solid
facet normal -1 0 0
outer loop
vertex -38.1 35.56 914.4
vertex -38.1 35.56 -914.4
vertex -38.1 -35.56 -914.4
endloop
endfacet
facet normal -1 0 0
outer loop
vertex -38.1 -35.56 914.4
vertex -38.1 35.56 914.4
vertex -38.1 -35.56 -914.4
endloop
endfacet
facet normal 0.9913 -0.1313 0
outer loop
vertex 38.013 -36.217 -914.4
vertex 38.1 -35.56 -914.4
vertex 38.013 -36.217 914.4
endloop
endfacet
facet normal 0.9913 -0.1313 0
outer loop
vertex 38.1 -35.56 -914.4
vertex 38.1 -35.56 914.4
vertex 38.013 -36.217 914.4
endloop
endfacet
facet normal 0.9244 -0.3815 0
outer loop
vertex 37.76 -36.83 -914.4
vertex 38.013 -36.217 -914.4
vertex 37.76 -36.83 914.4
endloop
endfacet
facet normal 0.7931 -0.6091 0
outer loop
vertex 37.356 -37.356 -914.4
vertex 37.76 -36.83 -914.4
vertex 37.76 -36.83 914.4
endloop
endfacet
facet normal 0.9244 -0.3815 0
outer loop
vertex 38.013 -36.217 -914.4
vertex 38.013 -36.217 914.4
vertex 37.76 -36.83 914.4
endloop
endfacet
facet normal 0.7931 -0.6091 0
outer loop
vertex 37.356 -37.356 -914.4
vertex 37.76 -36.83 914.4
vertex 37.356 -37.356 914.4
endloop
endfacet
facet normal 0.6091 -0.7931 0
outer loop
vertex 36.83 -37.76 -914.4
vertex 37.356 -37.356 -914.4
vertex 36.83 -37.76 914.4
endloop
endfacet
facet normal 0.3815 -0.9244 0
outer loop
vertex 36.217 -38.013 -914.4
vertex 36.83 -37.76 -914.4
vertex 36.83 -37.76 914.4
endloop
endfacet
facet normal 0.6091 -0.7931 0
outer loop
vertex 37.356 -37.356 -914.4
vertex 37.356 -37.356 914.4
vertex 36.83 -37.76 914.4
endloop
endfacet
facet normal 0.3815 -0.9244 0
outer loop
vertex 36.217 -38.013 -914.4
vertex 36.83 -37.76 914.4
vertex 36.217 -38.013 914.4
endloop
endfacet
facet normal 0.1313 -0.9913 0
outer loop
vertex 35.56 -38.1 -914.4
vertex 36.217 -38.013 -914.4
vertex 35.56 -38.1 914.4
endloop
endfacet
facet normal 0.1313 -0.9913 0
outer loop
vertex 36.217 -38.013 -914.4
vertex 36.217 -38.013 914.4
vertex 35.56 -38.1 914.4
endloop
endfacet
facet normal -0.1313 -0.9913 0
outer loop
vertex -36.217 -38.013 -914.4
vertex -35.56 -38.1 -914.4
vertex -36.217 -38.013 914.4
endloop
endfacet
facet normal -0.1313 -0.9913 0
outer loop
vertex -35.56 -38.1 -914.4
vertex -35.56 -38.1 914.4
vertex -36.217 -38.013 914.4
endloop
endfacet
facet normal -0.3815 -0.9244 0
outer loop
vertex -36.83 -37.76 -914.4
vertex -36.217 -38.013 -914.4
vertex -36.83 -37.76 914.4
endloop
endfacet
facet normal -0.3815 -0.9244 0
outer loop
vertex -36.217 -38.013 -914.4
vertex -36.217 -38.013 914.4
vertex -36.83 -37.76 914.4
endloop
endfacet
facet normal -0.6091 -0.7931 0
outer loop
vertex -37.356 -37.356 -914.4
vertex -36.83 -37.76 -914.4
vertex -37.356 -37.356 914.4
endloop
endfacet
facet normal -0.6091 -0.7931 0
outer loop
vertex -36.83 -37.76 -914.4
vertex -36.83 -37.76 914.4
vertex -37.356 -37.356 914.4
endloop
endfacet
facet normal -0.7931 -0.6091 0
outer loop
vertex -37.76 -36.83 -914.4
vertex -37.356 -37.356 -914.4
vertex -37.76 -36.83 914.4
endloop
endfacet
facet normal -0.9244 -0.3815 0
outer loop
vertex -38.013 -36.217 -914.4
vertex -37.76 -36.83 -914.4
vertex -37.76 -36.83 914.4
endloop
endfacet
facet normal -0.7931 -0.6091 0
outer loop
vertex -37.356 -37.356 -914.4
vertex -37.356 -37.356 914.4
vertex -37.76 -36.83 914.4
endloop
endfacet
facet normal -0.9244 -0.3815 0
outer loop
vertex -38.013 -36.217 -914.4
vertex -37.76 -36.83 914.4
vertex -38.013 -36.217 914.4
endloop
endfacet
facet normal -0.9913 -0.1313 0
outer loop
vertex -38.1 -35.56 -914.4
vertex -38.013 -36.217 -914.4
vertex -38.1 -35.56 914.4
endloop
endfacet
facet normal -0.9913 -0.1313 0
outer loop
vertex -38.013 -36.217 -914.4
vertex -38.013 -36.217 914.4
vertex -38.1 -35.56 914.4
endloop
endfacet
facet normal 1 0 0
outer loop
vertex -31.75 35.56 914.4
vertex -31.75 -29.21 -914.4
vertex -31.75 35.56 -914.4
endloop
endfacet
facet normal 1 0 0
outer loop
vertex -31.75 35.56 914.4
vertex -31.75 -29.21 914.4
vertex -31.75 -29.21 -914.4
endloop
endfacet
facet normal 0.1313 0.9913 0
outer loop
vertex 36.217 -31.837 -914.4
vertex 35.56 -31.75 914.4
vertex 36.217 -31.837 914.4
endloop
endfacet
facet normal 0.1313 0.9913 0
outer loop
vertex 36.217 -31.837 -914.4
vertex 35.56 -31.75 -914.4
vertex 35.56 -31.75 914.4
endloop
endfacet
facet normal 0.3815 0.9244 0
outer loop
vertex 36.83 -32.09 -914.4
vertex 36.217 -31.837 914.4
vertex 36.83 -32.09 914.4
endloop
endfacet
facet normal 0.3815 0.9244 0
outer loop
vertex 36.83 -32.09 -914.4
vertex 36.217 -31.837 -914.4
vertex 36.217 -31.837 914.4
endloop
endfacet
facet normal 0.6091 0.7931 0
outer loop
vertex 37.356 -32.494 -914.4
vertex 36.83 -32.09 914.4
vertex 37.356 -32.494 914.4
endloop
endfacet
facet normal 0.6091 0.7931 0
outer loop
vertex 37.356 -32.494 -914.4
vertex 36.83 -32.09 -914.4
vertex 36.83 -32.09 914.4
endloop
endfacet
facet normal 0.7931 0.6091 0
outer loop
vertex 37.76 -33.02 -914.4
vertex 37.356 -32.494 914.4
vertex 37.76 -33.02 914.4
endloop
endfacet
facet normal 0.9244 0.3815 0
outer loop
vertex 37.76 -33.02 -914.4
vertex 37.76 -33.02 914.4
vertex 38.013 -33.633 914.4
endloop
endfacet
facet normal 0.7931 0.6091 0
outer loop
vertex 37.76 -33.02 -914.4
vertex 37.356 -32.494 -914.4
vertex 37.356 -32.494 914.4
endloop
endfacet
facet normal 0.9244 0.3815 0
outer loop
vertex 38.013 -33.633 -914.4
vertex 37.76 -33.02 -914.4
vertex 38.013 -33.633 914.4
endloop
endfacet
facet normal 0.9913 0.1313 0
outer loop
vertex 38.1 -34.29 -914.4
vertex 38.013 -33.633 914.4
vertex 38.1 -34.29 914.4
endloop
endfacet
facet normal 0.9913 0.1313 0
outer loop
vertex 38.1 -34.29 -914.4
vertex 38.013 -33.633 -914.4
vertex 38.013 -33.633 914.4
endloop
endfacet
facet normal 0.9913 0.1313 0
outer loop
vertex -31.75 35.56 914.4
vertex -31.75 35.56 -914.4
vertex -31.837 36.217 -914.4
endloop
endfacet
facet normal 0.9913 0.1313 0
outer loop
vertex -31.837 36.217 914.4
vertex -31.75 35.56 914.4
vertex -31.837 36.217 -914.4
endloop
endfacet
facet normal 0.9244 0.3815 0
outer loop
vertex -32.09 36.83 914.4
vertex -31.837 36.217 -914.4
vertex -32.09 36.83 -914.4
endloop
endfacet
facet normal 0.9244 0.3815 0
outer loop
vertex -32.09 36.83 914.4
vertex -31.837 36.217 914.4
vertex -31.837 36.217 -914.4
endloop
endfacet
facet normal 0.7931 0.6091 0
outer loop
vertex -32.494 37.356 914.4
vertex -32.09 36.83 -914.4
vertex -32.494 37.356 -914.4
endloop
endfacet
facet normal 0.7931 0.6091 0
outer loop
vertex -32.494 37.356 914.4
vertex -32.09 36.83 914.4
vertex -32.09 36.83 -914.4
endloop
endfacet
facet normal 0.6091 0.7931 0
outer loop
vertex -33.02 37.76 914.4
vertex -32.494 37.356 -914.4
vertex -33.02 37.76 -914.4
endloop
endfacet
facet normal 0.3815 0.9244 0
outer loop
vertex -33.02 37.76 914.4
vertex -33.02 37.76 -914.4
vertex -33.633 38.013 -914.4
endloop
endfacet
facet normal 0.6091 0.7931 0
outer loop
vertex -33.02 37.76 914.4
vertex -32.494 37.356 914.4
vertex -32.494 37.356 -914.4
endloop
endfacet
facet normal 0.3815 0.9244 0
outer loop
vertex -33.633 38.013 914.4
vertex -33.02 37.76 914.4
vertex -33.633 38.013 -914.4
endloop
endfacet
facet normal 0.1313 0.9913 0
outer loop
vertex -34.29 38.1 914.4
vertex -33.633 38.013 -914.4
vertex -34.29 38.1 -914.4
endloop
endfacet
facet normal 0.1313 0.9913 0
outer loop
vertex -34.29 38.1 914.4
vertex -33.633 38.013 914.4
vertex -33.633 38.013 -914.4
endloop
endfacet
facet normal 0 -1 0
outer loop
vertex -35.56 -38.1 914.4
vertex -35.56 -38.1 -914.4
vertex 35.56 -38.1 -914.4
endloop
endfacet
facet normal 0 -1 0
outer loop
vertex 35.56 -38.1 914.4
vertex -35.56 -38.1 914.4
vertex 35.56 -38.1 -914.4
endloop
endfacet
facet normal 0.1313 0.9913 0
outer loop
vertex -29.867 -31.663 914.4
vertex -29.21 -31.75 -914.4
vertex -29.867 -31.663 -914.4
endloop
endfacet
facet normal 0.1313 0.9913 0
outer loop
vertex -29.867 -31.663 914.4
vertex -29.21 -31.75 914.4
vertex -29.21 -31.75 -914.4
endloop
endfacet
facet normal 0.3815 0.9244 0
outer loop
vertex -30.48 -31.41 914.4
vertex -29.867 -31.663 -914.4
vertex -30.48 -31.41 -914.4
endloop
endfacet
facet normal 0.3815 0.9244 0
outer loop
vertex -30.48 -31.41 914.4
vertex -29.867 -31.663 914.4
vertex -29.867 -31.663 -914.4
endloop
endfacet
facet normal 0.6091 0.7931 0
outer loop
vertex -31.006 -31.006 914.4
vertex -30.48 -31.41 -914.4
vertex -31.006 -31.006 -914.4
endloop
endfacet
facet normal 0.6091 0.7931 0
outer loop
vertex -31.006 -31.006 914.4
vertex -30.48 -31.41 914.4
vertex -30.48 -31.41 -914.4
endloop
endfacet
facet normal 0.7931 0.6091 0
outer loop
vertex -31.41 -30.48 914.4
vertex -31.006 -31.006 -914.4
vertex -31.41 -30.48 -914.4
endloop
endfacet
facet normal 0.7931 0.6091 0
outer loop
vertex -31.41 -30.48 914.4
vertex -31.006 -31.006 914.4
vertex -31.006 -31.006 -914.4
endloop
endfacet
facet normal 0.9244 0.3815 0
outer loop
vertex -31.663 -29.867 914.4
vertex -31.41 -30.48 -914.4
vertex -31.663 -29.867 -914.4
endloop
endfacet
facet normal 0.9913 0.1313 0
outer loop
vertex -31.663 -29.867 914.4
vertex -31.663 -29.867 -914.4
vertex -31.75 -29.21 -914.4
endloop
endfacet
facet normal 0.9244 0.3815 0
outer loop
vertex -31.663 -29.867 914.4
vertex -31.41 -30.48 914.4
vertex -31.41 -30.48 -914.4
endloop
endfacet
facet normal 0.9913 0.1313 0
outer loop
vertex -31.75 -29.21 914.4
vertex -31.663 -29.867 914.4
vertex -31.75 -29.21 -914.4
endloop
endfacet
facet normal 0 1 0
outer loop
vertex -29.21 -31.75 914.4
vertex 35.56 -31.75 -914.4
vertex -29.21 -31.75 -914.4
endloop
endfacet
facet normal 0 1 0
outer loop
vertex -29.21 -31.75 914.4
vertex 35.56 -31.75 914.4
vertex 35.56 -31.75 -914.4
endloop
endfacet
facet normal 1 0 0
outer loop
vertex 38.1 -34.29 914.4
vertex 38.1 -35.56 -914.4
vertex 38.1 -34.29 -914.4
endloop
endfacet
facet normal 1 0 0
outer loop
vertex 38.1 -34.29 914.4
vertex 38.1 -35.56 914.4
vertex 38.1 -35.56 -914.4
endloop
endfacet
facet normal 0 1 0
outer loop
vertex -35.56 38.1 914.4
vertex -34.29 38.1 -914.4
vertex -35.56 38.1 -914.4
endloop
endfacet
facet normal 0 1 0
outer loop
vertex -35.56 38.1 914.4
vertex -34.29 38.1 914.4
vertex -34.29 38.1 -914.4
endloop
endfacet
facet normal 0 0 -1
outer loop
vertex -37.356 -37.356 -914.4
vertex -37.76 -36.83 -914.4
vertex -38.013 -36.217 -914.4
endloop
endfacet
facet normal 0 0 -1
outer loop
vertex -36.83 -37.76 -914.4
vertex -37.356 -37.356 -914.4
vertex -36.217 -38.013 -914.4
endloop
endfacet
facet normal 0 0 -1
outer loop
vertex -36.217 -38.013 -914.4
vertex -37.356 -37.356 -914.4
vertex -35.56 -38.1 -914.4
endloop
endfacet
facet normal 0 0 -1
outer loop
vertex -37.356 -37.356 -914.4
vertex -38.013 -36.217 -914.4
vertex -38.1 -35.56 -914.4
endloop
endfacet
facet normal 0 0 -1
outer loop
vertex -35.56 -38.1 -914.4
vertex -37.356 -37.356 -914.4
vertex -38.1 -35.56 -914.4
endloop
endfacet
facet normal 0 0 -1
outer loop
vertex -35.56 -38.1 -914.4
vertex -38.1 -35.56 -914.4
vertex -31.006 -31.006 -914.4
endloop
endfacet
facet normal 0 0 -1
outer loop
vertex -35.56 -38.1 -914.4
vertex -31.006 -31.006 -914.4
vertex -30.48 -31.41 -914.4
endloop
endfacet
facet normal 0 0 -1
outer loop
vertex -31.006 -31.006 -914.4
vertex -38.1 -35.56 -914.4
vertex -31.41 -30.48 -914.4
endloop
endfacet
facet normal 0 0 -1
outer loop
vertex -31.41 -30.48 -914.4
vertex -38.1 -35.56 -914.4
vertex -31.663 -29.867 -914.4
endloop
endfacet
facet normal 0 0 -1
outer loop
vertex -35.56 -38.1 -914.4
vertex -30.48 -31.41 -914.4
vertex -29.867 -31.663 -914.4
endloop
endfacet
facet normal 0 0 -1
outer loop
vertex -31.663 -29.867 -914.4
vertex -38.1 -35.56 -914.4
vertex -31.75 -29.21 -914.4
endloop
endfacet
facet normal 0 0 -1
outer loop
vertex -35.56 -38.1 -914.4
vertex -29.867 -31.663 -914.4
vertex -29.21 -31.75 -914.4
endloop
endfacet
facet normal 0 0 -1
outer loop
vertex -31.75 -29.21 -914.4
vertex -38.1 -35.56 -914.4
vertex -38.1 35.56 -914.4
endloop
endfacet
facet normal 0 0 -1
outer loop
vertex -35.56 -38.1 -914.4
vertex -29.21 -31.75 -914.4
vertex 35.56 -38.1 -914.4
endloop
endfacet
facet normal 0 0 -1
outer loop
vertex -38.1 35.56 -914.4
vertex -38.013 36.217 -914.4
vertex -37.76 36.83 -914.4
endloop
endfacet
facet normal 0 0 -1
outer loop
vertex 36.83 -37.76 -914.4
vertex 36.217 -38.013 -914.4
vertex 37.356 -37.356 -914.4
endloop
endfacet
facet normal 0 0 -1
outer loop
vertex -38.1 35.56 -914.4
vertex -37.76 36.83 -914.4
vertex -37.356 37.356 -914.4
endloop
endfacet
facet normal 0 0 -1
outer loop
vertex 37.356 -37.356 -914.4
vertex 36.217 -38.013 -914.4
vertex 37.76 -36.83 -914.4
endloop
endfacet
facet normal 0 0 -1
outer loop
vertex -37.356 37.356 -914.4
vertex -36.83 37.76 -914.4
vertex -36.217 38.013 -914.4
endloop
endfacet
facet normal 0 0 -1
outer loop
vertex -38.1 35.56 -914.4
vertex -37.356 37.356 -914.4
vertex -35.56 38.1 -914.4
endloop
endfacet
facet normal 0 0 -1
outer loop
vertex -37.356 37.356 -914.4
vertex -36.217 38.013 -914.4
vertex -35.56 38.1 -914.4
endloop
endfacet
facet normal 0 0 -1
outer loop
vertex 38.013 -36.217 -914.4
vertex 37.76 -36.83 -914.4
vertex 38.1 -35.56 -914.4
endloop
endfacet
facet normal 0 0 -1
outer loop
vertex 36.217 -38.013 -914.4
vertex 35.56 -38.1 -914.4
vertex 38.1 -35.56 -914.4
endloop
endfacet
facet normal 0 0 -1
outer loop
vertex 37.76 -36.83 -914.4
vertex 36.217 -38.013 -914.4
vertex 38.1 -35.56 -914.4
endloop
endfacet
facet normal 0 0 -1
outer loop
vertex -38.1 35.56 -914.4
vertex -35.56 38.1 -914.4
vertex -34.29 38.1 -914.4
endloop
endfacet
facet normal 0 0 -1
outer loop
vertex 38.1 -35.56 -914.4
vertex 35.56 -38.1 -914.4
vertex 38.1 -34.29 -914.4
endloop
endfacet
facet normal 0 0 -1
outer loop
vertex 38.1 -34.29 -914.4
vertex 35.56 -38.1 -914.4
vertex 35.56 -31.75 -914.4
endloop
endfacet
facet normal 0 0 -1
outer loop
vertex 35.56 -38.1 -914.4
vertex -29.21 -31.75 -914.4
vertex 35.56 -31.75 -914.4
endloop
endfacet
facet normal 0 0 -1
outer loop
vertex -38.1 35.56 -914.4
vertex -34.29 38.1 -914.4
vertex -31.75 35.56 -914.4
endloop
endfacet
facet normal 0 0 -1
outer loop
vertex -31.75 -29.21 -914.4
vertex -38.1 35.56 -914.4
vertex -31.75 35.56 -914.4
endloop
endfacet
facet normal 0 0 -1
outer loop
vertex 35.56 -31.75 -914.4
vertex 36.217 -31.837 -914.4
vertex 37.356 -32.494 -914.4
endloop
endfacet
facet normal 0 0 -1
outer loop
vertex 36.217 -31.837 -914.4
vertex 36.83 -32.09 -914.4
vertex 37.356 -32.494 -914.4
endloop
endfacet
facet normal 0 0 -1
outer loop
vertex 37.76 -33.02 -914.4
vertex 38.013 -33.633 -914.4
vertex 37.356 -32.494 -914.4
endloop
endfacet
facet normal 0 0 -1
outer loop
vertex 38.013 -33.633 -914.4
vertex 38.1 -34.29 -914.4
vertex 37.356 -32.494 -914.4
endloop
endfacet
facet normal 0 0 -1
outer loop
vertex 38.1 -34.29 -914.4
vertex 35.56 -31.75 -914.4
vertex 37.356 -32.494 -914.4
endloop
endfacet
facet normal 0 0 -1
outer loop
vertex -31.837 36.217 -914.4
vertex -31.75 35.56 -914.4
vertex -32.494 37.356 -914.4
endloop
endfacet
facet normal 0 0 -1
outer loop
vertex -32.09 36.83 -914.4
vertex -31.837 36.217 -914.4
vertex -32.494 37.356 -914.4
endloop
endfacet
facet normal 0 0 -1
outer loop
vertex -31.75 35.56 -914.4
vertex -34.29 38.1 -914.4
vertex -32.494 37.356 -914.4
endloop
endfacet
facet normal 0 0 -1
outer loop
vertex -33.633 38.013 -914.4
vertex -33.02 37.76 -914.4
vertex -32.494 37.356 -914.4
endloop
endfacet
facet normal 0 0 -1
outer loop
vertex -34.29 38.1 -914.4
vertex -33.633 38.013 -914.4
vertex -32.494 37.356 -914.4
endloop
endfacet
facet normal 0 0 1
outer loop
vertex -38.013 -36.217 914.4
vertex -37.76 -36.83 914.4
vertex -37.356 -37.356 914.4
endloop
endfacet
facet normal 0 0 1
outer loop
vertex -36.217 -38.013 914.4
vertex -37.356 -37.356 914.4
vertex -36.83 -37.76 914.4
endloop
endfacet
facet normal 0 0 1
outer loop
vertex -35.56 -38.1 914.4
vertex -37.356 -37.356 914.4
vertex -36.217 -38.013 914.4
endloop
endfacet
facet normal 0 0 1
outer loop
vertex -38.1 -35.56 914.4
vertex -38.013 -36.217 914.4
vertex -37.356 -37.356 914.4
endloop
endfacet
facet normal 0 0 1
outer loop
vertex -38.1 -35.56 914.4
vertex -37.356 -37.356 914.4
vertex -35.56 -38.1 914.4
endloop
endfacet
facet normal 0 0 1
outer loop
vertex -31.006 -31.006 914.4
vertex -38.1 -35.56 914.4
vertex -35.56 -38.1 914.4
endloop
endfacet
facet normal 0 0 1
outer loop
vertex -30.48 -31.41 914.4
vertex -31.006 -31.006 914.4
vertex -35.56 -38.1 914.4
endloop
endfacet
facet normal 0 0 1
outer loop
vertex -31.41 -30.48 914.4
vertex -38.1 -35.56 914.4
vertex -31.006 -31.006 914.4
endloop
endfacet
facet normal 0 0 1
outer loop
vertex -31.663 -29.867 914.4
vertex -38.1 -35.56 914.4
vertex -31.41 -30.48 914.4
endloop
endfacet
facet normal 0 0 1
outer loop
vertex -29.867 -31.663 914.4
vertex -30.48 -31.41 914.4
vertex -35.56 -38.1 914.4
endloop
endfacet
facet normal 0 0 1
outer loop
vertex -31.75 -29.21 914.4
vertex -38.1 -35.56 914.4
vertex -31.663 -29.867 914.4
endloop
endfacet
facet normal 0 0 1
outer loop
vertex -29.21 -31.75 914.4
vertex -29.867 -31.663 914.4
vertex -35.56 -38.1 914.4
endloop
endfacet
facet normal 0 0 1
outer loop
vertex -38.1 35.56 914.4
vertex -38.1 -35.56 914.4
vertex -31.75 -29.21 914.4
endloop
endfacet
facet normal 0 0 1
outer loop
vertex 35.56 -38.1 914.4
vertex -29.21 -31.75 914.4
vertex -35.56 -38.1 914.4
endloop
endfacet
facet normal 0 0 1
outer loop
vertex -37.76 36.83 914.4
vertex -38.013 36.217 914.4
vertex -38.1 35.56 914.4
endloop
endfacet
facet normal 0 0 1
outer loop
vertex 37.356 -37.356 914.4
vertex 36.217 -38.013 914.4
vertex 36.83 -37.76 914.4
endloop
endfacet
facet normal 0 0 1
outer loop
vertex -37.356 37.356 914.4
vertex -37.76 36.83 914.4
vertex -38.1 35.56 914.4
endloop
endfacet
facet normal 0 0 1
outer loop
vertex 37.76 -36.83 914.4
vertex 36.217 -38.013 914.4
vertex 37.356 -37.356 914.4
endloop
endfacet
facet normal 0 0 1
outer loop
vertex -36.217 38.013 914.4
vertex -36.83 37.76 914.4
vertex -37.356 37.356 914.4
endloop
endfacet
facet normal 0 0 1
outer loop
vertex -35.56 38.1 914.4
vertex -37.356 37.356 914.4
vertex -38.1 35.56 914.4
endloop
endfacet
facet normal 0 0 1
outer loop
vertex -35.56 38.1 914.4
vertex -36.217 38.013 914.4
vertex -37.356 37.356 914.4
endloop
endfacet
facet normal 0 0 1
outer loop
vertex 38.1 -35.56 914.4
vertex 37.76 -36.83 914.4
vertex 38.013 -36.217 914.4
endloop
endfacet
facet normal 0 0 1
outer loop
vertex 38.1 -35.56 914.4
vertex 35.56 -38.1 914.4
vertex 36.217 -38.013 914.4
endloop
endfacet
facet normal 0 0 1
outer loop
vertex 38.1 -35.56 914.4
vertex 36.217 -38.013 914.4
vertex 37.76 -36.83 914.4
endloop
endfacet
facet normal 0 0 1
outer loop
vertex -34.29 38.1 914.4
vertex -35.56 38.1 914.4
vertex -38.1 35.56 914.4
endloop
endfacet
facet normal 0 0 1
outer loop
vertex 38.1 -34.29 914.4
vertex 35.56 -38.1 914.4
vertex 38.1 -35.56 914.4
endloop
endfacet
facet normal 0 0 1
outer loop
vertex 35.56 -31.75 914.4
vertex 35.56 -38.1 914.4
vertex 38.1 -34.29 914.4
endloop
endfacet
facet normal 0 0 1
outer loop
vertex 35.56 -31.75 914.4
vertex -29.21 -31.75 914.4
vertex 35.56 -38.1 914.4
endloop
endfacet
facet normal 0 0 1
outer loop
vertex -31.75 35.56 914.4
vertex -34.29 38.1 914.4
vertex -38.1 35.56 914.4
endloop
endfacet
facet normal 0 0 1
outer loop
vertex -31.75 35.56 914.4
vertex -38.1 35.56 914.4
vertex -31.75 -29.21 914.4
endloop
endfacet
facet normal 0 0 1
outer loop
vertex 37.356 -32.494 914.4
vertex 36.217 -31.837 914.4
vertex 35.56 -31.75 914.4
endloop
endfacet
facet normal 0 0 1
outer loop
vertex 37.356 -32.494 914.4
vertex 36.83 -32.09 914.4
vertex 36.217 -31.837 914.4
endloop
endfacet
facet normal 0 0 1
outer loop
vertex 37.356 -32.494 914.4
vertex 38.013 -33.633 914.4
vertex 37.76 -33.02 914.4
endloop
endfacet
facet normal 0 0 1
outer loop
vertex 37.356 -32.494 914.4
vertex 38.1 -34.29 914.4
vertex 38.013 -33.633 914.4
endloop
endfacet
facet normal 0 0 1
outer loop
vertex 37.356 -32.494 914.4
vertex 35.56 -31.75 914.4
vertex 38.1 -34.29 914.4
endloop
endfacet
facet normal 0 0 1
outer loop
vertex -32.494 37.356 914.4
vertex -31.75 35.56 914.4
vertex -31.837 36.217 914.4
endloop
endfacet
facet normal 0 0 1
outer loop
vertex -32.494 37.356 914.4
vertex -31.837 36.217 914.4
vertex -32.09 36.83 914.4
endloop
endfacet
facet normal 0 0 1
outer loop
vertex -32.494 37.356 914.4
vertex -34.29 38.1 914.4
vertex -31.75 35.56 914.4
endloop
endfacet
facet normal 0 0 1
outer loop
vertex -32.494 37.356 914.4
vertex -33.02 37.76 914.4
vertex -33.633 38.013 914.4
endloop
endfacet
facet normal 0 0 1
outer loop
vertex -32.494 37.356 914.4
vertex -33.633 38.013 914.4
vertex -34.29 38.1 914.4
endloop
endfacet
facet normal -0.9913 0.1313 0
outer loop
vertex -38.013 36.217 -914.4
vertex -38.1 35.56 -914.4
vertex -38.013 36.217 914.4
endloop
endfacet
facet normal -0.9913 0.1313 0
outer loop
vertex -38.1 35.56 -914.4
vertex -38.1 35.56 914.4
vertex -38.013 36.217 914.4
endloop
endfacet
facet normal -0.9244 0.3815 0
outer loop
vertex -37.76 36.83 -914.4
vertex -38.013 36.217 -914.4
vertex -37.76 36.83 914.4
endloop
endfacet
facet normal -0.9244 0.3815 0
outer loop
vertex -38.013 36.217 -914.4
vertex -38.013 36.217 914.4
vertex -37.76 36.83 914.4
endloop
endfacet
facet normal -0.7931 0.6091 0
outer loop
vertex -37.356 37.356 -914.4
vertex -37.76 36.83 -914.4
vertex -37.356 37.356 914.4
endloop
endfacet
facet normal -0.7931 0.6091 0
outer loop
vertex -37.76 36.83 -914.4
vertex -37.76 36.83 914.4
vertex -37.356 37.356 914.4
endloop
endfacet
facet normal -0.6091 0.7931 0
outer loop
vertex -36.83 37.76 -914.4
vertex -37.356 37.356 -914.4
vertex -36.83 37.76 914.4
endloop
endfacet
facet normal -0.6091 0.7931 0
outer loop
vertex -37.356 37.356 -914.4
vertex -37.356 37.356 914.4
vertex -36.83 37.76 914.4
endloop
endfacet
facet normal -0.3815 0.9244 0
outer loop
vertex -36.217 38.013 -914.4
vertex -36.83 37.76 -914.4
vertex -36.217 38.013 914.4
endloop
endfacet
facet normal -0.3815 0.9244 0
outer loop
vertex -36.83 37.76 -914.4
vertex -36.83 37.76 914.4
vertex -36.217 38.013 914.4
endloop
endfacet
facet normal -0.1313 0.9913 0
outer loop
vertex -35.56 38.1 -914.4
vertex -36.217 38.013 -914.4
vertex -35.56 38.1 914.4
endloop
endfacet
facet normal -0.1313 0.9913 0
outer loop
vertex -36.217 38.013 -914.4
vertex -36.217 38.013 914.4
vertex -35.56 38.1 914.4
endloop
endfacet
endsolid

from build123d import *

# Parameters (mm, degrees)
BOSS_EXTRUDE1_DEPTH      = 914.4
BOSS_EXTRUDE1_DEPTH_BACK = 914.4
FILLET1_R                = 2.54


with BuildPart() as part:
    # Sketch4 → Boss-Extrude1 (new body, two sides)
    with BuildSketch(Plane.XY) as boss_extrude1_sk:
        with BuildLine():
            Line((-31.75, -29.21), (-31.75, 38.1))
            Line((-31.75, 38.1), (-38.1, 38.1))
            Line((-38.1, 38.1), (-38.1, -38.1))
            Line((-38.1, -38.1), (38.1, -38.1))
            Line((38.1, -38.1), (38.1, -31.75))
            Line((38.1, -31.75), (-29.21, -31.75))
            ThreePointArc((-29.21, -31.75), (-31.006051224, -31.006051224), (-31.75, -29.21))
        make_face()
    extrude(amount=BOSS_EXTRUDE1_DEPTH)
    extrude(boss_extrude1_sk.sketch, amount=-BOSS_EXTRUDE1_DEPTH_BACK)

    # Fillet1
    fillet1_edges = [part.edges().sort_by_distance(p)[0] for p in [
        (-31.75, 38.1, 0),
        (38.1, -31.75, 0),
        (38.1, -38.1, 0),
        (-38.1, -38.1, 0),
        (-38.1, 38.1, 0),
    ]]
    fillet(fillet1_edges, radius=FILLET1_R)


solid = part.part
